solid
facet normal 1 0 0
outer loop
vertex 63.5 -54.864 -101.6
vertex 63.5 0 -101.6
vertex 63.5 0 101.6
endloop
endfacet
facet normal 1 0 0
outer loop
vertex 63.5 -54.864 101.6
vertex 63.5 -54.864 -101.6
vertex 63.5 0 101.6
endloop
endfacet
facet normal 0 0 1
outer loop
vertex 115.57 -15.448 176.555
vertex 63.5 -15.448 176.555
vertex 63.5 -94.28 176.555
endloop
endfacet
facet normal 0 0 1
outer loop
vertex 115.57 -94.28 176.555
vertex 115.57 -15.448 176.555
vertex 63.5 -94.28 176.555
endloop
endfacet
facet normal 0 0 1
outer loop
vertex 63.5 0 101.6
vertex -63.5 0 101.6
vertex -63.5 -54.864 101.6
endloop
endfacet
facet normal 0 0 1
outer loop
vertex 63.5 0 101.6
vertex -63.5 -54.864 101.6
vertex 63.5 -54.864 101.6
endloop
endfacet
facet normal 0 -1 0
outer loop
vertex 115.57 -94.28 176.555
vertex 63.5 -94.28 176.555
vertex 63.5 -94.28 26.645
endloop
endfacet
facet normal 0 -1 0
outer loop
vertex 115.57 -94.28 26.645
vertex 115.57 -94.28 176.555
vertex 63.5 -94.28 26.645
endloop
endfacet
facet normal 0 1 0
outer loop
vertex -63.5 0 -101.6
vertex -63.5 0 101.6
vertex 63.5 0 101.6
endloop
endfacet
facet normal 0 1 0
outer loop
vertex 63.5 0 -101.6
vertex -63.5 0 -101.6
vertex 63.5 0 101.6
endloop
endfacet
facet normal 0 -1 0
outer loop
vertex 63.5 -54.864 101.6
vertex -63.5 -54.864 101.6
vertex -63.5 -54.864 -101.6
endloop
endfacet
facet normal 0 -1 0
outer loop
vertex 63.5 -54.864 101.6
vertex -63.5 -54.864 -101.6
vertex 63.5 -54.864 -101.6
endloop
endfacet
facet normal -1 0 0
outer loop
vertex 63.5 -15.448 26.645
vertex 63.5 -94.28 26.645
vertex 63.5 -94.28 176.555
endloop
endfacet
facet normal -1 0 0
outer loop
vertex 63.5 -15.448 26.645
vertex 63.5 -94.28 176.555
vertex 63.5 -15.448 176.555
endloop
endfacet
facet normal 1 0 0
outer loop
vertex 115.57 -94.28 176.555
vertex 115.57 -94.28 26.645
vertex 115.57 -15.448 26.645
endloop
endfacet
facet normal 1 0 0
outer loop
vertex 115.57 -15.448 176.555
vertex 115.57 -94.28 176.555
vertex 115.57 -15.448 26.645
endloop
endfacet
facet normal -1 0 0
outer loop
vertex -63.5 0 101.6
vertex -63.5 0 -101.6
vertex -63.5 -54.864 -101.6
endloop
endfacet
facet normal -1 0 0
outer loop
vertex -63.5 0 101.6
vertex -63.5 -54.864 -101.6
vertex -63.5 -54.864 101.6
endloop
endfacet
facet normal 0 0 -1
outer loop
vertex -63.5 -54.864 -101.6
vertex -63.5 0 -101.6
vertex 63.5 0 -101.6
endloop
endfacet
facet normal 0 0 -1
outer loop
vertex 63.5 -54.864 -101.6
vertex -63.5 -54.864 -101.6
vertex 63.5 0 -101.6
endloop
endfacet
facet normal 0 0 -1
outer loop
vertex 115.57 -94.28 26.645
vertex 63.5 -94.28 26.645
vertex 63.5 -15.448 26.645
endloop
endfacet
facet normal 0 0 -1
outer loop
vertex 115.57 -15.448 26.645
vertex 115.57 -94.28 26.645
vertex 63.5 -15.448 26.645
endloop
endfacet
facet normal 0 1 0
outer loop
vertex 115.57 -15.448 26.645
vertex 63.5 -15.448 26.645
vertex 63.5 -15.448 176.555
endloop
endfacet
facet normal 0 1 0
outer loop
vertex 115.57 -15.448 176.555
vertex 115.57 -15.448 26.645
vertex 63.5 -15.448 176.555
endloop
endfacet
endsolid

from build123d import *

# Parameters (mm, degrees)
F0_W     = 127
F0_H     = 203.2
F1_DEPTH = 54.864
F2_W     = 39.4155723677
F2_H     = 74.955454731
F3_DEPTH = 52.07


with BuildPart() as f1:
    # F0 (on Front) → F1 (new body)
    with BuildSketch(Plane.XZ):
        Rectangle(F0_W, F0_H)
    extrude(amount=F1_DEPTH)


with BuildPart() as f3:
    # F2 (on face) → F3 (new body)
    with BuildSketch(Plane.YZ.offset(63.5)):
        Polygon((-15.4484276323, 176.555454731), (-94.2795723677, 176.555454731), (-94.2795723677, 26.644545269), (-54.864, 26.644545269), (-54.864, 101.6), (-15.4484276323, 101.6), align=None)
        with Locations((-35.1562138162, 64.1222726345)):
            Rectangle(F2_W, F2_H)
    extrude(amount=F3_DEPTH)


solid = Compound([f1.part, f3.part])
